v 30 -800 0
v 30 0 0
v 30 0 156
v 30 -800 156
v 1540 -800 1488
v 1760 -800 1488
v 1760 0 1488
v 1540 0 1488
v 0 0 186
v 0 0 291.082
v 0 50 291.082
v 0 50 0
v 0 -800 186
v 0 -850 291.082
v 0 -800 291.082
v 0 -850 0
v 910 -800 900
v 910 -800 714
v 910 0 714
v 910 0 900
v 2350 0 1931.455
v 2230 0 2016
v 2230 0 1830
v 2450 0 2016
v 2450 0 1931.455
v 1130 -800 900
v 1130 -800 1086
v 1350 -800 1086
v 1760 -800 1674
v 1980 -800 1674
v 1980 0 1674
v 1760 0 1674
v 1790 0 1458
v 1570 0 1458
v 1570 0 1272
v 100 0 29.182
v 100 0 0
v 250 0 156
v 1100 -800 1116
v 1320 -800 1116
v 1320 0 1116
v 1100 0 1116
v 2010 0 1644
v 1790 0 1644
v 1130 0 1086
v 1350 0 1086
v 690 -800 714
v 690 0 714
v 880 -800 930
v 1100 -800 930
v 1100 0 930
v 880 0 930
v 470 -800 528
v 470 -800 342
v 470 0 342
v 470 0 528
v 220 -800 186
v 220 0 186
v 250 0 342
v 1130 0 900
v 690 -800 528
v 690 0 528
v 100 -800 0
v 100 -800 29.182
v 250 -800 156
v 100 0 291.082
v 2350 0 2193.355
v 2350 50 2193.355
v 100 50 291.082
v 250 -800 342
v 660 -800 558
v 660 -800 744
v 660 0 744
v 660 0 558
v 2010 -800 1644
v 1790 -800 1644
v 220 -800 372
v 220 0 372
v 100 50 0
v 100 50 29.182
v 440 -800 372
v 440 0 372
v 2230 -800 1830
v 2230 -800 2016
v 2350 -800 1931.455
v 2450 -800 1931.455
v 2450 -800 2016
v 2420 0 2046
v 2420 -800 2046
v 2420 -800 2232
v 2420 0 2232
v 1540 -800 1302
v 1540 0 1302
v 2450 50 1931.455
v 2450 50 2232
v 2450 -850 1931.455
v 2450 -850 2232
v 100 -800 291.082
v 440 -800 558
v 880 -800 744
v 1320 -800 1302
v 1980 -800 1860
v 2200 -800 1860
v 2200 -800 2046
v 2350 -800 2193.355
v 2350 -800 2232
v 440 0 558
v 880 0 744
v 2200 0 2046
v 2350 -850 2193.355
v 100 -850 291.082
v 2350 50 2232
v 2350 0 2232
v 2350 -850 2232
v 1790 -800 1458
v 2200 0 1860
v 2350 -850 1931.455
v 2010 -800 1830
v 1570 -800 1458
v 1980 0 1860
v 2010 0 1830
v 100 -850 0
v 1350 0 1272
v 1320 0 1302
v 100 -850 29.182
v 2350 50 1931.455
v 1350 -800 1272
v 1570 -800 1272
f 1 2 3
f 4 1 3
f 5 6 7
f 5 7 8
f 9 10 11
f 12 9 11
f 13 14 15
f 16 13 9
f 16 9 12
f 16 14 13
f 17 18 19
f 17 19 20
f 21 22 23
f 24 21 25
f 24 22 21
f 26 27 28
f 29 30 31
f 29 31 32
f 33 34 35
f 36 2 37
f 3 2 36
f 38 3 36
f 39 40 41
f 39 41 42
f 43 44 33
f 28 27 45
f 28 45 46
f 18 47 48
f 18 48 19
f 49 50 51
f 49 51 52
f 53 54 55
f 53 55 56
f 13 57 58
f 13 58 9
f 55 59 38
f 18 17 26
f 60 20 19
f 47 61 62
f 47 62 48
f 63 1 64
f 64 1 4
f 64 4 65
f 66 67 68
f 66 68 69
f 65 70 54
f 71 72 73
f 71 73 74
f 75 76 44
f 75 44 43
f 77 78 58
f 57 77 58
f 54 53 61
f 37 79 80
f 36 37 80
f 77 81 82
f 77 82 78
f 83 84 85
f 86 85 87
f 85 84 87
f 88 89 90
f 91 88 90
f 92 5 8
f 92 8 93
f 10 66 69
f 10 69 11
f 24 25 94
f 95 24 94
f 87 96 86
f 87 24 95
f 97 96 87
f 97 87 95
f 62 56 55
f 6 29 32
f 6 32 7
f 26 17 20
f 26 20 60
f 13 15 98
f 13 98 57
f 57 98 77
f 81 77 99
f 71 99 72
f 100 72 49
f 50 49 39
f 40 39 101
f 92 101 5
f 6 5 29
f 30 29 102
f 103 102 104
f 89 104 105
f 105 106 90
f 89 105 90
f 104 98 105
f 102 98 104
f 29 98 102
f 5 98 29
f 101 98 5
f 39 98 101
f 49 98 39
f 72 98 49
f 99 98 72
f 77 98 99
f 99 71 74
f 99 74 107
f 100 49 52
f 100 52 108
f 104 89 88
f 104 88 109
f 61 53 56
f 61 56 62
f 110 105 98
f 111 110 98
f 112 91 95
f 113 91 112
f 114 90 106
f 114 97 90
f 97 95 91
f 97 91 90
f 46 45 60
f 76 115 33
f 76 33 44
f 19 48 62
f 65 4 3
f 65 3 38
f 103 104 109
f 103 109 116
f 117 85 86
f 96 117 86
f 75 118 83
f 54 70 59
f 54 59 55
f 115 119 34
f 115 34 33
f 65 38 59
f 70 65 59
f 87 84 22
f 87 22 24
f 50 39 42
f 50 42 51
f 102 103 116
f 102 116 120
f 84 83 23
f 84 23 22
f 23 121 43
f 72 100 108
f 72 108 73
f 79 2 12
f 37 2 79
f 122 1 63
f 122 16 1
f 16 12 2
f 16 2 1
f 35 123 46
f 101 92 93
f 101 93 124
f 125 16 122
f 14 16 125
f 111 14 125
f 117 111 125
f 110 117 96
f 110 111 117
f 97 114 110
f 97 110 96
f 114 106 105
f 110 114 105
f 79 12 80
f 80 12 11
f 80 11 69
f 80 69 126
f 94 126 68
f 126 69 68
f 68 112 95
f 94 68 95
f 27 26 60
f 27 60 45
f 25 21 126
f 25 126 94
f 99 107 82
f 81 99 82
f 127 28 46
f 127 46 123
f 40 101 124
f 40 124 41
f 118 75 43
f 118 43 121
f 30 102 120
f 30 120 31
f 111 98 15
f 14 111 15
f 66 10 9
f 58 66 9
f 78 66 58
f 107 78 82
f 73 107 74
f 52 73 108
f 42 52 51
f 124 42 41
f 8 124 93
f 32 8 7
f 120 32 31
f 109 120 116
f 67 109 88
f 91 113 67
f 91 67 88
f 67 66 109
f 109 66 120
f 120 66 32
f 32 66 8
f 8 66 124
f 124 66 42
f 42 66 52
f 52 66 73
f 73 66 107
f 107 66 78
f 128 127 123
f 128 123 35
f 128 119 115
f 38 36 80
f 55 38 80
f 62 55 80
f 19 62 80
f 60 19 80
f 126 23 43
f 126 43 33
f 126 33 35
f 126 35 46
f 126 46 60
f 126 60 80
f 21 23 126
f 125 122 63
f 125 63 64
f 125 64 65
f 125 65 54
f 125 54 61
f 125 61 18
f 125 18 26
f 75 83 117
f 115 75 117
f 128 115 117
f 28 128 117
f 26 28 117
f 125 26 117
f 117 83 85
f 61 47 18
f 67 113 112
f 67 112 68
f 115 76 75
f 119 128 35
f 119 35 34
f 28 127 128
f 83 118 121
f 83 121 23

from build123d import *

# Parameters (mm, degrees)
F0_W     = 30
F0_H     = 156
F0_H_2   = 186
F1_DEPTH = 800
F3_DEPTH = 50
F5_DEPTH = 50


with BuildPart() as f1:
    # F0 (on Front) → F1 (new body)
    with BuildSketch(Plane.XZ):
        with Locations((15, 78)):
            Rectangle(F0_W, F0_H)
        Polygon((0, 186), (0, 156), (30, 156), (250, 156), (250, 186), (220, 186), align=None)
        with Locations((235, 264)):
            Rectangle(F0_W, F0_H)
        Polygon((220, 372), (220, 342), (250, 342), (470, 342), (470, 372), (440, 372), align=None)
        with Locations((455, 450)):
            Rectangle(F0_W, F0_H)
        Polygon((440, 558), (440, 528), (470, 528), (690, 528), (690, 558), (660, 558), align=None)
        with Locations((675, 636)):
            Rectangle(F0_W, F0_H)
        Polygon((660, 744), (660, 714), (690, 714), (910, 714), (910, 744), (880, 744), align=None)
        with Locations((895, 822)):
            Rectangle(F0_W, F0_H)
        Polygon((880, 930), (880, 900), (910, 900), (1130, 900), (1130, 930), (1100, 930), align=None)
        with Locations((1115, 1008)):
            Rectangle(F0_W, F0_H)
        Polygon((1100, 1116), (1100, 1086), (1130, 1086), (1350, 1086), (1350, 1116), (1320, 1116), align=None)
        with Locations((1335, 1194)):
            Rectangle(F0_W, F0_H)
        Polygon((1320, 1302), (1320, 1272), (1350, 1272), (1570, 1272), (1570, 1302), (1540, 1302), align=None)
        with Locations((1555, 1380)):
            Rectangle(F0_W, F0_H)
        Polygon((1540, 1488), (1540, 1458), (1570, 1458), (1790, 1458), (1790, 1488), (1760, 1488), align=None)
        with Locations((1775, 1566)):
            Rectangle(F0_W, F0_H)
        Polygon((1760, 1674), (1760, 1644), (1790, 1644), (2010, 1644), (2010, 1674), (1980, 1674), align=None)
        with Locations((1995, 1752)):
            Rectangle(F0_W, F0_H)
        Polygon((1980, 1860), (1980, 1830), (2010, 1830), (2230, 1830), (2230, 1860), (2200, 1860), align=None)
        with Locations((2215, 1938)):
            Rectangle(F0_W, F0_H)
        Polygon((2200, 2046), (2200, 2016), (2230, 2016), (2420, 2016), (2450, 2016), (2450, 2046), (2420, 2046), align=None)
        with Locations((2435, 2139)):
            Rectangle(F0_W, F0_H_2)
    extrude(amount=F1_DEPTH)

    # F2 (on face) → F3 (join)
    with BuildSketch(Plane.XZ.offset(800)):
        Polygon((2450, 1931.4545454545), (2450, 2232), (2350, 2232), (2350, 2193.3547851207), (2350, 2062.4046652876), (2350, 1931.4545454545), align=None)
        Polygon((100, 29.1818181818), (2350, 1931.4545454545), (2350, 2062.4046652876), (100, 160.1319380149), align=None)
        Polygon((2350, 2062.4046652876), (2350, 2193.3547851207), (100, 291.082057848), (100, 186), (100, 160.1319380149), align=None)
        Polygon((100, 0), (100, 29.1818181818), (100, 160.1319380149), (100, 186), (100, 291.082057848), (0, 291.082057848), (0, 0), align=None)
    extrude(amount=F3_DEPTH)

    # F4 (on face) → F5 (join)
    with BuildSketch(Plane.XZ):
        Polygon((2450, 1931.4545454545), (2450, 2232), (2350, 2232), (2350, 2193.3547851207), (2350, 2062.4046652876), (2350, 1931.4545454545), align=None)
        Polygon((100, 29.1818181818), (2350, 1931.4545454545), (2350, 2062.4046652876), (100, 160.1319380149), align=None)
        Polygon((2350, 2062.4046652876), (2350, 2193.3547851207), (100, 291.082057848), (100, 186), (100, 160.1319380149), align=None)
        Polygon((100, 0), (100, 29.1818181818), (100, 160.1319380149), (100, 186), (100, 291.082057848), (0, 291.082057848), (0, 0), align=None)
    extrude(amount=-F5_DEPTH)


solid = f1.part
